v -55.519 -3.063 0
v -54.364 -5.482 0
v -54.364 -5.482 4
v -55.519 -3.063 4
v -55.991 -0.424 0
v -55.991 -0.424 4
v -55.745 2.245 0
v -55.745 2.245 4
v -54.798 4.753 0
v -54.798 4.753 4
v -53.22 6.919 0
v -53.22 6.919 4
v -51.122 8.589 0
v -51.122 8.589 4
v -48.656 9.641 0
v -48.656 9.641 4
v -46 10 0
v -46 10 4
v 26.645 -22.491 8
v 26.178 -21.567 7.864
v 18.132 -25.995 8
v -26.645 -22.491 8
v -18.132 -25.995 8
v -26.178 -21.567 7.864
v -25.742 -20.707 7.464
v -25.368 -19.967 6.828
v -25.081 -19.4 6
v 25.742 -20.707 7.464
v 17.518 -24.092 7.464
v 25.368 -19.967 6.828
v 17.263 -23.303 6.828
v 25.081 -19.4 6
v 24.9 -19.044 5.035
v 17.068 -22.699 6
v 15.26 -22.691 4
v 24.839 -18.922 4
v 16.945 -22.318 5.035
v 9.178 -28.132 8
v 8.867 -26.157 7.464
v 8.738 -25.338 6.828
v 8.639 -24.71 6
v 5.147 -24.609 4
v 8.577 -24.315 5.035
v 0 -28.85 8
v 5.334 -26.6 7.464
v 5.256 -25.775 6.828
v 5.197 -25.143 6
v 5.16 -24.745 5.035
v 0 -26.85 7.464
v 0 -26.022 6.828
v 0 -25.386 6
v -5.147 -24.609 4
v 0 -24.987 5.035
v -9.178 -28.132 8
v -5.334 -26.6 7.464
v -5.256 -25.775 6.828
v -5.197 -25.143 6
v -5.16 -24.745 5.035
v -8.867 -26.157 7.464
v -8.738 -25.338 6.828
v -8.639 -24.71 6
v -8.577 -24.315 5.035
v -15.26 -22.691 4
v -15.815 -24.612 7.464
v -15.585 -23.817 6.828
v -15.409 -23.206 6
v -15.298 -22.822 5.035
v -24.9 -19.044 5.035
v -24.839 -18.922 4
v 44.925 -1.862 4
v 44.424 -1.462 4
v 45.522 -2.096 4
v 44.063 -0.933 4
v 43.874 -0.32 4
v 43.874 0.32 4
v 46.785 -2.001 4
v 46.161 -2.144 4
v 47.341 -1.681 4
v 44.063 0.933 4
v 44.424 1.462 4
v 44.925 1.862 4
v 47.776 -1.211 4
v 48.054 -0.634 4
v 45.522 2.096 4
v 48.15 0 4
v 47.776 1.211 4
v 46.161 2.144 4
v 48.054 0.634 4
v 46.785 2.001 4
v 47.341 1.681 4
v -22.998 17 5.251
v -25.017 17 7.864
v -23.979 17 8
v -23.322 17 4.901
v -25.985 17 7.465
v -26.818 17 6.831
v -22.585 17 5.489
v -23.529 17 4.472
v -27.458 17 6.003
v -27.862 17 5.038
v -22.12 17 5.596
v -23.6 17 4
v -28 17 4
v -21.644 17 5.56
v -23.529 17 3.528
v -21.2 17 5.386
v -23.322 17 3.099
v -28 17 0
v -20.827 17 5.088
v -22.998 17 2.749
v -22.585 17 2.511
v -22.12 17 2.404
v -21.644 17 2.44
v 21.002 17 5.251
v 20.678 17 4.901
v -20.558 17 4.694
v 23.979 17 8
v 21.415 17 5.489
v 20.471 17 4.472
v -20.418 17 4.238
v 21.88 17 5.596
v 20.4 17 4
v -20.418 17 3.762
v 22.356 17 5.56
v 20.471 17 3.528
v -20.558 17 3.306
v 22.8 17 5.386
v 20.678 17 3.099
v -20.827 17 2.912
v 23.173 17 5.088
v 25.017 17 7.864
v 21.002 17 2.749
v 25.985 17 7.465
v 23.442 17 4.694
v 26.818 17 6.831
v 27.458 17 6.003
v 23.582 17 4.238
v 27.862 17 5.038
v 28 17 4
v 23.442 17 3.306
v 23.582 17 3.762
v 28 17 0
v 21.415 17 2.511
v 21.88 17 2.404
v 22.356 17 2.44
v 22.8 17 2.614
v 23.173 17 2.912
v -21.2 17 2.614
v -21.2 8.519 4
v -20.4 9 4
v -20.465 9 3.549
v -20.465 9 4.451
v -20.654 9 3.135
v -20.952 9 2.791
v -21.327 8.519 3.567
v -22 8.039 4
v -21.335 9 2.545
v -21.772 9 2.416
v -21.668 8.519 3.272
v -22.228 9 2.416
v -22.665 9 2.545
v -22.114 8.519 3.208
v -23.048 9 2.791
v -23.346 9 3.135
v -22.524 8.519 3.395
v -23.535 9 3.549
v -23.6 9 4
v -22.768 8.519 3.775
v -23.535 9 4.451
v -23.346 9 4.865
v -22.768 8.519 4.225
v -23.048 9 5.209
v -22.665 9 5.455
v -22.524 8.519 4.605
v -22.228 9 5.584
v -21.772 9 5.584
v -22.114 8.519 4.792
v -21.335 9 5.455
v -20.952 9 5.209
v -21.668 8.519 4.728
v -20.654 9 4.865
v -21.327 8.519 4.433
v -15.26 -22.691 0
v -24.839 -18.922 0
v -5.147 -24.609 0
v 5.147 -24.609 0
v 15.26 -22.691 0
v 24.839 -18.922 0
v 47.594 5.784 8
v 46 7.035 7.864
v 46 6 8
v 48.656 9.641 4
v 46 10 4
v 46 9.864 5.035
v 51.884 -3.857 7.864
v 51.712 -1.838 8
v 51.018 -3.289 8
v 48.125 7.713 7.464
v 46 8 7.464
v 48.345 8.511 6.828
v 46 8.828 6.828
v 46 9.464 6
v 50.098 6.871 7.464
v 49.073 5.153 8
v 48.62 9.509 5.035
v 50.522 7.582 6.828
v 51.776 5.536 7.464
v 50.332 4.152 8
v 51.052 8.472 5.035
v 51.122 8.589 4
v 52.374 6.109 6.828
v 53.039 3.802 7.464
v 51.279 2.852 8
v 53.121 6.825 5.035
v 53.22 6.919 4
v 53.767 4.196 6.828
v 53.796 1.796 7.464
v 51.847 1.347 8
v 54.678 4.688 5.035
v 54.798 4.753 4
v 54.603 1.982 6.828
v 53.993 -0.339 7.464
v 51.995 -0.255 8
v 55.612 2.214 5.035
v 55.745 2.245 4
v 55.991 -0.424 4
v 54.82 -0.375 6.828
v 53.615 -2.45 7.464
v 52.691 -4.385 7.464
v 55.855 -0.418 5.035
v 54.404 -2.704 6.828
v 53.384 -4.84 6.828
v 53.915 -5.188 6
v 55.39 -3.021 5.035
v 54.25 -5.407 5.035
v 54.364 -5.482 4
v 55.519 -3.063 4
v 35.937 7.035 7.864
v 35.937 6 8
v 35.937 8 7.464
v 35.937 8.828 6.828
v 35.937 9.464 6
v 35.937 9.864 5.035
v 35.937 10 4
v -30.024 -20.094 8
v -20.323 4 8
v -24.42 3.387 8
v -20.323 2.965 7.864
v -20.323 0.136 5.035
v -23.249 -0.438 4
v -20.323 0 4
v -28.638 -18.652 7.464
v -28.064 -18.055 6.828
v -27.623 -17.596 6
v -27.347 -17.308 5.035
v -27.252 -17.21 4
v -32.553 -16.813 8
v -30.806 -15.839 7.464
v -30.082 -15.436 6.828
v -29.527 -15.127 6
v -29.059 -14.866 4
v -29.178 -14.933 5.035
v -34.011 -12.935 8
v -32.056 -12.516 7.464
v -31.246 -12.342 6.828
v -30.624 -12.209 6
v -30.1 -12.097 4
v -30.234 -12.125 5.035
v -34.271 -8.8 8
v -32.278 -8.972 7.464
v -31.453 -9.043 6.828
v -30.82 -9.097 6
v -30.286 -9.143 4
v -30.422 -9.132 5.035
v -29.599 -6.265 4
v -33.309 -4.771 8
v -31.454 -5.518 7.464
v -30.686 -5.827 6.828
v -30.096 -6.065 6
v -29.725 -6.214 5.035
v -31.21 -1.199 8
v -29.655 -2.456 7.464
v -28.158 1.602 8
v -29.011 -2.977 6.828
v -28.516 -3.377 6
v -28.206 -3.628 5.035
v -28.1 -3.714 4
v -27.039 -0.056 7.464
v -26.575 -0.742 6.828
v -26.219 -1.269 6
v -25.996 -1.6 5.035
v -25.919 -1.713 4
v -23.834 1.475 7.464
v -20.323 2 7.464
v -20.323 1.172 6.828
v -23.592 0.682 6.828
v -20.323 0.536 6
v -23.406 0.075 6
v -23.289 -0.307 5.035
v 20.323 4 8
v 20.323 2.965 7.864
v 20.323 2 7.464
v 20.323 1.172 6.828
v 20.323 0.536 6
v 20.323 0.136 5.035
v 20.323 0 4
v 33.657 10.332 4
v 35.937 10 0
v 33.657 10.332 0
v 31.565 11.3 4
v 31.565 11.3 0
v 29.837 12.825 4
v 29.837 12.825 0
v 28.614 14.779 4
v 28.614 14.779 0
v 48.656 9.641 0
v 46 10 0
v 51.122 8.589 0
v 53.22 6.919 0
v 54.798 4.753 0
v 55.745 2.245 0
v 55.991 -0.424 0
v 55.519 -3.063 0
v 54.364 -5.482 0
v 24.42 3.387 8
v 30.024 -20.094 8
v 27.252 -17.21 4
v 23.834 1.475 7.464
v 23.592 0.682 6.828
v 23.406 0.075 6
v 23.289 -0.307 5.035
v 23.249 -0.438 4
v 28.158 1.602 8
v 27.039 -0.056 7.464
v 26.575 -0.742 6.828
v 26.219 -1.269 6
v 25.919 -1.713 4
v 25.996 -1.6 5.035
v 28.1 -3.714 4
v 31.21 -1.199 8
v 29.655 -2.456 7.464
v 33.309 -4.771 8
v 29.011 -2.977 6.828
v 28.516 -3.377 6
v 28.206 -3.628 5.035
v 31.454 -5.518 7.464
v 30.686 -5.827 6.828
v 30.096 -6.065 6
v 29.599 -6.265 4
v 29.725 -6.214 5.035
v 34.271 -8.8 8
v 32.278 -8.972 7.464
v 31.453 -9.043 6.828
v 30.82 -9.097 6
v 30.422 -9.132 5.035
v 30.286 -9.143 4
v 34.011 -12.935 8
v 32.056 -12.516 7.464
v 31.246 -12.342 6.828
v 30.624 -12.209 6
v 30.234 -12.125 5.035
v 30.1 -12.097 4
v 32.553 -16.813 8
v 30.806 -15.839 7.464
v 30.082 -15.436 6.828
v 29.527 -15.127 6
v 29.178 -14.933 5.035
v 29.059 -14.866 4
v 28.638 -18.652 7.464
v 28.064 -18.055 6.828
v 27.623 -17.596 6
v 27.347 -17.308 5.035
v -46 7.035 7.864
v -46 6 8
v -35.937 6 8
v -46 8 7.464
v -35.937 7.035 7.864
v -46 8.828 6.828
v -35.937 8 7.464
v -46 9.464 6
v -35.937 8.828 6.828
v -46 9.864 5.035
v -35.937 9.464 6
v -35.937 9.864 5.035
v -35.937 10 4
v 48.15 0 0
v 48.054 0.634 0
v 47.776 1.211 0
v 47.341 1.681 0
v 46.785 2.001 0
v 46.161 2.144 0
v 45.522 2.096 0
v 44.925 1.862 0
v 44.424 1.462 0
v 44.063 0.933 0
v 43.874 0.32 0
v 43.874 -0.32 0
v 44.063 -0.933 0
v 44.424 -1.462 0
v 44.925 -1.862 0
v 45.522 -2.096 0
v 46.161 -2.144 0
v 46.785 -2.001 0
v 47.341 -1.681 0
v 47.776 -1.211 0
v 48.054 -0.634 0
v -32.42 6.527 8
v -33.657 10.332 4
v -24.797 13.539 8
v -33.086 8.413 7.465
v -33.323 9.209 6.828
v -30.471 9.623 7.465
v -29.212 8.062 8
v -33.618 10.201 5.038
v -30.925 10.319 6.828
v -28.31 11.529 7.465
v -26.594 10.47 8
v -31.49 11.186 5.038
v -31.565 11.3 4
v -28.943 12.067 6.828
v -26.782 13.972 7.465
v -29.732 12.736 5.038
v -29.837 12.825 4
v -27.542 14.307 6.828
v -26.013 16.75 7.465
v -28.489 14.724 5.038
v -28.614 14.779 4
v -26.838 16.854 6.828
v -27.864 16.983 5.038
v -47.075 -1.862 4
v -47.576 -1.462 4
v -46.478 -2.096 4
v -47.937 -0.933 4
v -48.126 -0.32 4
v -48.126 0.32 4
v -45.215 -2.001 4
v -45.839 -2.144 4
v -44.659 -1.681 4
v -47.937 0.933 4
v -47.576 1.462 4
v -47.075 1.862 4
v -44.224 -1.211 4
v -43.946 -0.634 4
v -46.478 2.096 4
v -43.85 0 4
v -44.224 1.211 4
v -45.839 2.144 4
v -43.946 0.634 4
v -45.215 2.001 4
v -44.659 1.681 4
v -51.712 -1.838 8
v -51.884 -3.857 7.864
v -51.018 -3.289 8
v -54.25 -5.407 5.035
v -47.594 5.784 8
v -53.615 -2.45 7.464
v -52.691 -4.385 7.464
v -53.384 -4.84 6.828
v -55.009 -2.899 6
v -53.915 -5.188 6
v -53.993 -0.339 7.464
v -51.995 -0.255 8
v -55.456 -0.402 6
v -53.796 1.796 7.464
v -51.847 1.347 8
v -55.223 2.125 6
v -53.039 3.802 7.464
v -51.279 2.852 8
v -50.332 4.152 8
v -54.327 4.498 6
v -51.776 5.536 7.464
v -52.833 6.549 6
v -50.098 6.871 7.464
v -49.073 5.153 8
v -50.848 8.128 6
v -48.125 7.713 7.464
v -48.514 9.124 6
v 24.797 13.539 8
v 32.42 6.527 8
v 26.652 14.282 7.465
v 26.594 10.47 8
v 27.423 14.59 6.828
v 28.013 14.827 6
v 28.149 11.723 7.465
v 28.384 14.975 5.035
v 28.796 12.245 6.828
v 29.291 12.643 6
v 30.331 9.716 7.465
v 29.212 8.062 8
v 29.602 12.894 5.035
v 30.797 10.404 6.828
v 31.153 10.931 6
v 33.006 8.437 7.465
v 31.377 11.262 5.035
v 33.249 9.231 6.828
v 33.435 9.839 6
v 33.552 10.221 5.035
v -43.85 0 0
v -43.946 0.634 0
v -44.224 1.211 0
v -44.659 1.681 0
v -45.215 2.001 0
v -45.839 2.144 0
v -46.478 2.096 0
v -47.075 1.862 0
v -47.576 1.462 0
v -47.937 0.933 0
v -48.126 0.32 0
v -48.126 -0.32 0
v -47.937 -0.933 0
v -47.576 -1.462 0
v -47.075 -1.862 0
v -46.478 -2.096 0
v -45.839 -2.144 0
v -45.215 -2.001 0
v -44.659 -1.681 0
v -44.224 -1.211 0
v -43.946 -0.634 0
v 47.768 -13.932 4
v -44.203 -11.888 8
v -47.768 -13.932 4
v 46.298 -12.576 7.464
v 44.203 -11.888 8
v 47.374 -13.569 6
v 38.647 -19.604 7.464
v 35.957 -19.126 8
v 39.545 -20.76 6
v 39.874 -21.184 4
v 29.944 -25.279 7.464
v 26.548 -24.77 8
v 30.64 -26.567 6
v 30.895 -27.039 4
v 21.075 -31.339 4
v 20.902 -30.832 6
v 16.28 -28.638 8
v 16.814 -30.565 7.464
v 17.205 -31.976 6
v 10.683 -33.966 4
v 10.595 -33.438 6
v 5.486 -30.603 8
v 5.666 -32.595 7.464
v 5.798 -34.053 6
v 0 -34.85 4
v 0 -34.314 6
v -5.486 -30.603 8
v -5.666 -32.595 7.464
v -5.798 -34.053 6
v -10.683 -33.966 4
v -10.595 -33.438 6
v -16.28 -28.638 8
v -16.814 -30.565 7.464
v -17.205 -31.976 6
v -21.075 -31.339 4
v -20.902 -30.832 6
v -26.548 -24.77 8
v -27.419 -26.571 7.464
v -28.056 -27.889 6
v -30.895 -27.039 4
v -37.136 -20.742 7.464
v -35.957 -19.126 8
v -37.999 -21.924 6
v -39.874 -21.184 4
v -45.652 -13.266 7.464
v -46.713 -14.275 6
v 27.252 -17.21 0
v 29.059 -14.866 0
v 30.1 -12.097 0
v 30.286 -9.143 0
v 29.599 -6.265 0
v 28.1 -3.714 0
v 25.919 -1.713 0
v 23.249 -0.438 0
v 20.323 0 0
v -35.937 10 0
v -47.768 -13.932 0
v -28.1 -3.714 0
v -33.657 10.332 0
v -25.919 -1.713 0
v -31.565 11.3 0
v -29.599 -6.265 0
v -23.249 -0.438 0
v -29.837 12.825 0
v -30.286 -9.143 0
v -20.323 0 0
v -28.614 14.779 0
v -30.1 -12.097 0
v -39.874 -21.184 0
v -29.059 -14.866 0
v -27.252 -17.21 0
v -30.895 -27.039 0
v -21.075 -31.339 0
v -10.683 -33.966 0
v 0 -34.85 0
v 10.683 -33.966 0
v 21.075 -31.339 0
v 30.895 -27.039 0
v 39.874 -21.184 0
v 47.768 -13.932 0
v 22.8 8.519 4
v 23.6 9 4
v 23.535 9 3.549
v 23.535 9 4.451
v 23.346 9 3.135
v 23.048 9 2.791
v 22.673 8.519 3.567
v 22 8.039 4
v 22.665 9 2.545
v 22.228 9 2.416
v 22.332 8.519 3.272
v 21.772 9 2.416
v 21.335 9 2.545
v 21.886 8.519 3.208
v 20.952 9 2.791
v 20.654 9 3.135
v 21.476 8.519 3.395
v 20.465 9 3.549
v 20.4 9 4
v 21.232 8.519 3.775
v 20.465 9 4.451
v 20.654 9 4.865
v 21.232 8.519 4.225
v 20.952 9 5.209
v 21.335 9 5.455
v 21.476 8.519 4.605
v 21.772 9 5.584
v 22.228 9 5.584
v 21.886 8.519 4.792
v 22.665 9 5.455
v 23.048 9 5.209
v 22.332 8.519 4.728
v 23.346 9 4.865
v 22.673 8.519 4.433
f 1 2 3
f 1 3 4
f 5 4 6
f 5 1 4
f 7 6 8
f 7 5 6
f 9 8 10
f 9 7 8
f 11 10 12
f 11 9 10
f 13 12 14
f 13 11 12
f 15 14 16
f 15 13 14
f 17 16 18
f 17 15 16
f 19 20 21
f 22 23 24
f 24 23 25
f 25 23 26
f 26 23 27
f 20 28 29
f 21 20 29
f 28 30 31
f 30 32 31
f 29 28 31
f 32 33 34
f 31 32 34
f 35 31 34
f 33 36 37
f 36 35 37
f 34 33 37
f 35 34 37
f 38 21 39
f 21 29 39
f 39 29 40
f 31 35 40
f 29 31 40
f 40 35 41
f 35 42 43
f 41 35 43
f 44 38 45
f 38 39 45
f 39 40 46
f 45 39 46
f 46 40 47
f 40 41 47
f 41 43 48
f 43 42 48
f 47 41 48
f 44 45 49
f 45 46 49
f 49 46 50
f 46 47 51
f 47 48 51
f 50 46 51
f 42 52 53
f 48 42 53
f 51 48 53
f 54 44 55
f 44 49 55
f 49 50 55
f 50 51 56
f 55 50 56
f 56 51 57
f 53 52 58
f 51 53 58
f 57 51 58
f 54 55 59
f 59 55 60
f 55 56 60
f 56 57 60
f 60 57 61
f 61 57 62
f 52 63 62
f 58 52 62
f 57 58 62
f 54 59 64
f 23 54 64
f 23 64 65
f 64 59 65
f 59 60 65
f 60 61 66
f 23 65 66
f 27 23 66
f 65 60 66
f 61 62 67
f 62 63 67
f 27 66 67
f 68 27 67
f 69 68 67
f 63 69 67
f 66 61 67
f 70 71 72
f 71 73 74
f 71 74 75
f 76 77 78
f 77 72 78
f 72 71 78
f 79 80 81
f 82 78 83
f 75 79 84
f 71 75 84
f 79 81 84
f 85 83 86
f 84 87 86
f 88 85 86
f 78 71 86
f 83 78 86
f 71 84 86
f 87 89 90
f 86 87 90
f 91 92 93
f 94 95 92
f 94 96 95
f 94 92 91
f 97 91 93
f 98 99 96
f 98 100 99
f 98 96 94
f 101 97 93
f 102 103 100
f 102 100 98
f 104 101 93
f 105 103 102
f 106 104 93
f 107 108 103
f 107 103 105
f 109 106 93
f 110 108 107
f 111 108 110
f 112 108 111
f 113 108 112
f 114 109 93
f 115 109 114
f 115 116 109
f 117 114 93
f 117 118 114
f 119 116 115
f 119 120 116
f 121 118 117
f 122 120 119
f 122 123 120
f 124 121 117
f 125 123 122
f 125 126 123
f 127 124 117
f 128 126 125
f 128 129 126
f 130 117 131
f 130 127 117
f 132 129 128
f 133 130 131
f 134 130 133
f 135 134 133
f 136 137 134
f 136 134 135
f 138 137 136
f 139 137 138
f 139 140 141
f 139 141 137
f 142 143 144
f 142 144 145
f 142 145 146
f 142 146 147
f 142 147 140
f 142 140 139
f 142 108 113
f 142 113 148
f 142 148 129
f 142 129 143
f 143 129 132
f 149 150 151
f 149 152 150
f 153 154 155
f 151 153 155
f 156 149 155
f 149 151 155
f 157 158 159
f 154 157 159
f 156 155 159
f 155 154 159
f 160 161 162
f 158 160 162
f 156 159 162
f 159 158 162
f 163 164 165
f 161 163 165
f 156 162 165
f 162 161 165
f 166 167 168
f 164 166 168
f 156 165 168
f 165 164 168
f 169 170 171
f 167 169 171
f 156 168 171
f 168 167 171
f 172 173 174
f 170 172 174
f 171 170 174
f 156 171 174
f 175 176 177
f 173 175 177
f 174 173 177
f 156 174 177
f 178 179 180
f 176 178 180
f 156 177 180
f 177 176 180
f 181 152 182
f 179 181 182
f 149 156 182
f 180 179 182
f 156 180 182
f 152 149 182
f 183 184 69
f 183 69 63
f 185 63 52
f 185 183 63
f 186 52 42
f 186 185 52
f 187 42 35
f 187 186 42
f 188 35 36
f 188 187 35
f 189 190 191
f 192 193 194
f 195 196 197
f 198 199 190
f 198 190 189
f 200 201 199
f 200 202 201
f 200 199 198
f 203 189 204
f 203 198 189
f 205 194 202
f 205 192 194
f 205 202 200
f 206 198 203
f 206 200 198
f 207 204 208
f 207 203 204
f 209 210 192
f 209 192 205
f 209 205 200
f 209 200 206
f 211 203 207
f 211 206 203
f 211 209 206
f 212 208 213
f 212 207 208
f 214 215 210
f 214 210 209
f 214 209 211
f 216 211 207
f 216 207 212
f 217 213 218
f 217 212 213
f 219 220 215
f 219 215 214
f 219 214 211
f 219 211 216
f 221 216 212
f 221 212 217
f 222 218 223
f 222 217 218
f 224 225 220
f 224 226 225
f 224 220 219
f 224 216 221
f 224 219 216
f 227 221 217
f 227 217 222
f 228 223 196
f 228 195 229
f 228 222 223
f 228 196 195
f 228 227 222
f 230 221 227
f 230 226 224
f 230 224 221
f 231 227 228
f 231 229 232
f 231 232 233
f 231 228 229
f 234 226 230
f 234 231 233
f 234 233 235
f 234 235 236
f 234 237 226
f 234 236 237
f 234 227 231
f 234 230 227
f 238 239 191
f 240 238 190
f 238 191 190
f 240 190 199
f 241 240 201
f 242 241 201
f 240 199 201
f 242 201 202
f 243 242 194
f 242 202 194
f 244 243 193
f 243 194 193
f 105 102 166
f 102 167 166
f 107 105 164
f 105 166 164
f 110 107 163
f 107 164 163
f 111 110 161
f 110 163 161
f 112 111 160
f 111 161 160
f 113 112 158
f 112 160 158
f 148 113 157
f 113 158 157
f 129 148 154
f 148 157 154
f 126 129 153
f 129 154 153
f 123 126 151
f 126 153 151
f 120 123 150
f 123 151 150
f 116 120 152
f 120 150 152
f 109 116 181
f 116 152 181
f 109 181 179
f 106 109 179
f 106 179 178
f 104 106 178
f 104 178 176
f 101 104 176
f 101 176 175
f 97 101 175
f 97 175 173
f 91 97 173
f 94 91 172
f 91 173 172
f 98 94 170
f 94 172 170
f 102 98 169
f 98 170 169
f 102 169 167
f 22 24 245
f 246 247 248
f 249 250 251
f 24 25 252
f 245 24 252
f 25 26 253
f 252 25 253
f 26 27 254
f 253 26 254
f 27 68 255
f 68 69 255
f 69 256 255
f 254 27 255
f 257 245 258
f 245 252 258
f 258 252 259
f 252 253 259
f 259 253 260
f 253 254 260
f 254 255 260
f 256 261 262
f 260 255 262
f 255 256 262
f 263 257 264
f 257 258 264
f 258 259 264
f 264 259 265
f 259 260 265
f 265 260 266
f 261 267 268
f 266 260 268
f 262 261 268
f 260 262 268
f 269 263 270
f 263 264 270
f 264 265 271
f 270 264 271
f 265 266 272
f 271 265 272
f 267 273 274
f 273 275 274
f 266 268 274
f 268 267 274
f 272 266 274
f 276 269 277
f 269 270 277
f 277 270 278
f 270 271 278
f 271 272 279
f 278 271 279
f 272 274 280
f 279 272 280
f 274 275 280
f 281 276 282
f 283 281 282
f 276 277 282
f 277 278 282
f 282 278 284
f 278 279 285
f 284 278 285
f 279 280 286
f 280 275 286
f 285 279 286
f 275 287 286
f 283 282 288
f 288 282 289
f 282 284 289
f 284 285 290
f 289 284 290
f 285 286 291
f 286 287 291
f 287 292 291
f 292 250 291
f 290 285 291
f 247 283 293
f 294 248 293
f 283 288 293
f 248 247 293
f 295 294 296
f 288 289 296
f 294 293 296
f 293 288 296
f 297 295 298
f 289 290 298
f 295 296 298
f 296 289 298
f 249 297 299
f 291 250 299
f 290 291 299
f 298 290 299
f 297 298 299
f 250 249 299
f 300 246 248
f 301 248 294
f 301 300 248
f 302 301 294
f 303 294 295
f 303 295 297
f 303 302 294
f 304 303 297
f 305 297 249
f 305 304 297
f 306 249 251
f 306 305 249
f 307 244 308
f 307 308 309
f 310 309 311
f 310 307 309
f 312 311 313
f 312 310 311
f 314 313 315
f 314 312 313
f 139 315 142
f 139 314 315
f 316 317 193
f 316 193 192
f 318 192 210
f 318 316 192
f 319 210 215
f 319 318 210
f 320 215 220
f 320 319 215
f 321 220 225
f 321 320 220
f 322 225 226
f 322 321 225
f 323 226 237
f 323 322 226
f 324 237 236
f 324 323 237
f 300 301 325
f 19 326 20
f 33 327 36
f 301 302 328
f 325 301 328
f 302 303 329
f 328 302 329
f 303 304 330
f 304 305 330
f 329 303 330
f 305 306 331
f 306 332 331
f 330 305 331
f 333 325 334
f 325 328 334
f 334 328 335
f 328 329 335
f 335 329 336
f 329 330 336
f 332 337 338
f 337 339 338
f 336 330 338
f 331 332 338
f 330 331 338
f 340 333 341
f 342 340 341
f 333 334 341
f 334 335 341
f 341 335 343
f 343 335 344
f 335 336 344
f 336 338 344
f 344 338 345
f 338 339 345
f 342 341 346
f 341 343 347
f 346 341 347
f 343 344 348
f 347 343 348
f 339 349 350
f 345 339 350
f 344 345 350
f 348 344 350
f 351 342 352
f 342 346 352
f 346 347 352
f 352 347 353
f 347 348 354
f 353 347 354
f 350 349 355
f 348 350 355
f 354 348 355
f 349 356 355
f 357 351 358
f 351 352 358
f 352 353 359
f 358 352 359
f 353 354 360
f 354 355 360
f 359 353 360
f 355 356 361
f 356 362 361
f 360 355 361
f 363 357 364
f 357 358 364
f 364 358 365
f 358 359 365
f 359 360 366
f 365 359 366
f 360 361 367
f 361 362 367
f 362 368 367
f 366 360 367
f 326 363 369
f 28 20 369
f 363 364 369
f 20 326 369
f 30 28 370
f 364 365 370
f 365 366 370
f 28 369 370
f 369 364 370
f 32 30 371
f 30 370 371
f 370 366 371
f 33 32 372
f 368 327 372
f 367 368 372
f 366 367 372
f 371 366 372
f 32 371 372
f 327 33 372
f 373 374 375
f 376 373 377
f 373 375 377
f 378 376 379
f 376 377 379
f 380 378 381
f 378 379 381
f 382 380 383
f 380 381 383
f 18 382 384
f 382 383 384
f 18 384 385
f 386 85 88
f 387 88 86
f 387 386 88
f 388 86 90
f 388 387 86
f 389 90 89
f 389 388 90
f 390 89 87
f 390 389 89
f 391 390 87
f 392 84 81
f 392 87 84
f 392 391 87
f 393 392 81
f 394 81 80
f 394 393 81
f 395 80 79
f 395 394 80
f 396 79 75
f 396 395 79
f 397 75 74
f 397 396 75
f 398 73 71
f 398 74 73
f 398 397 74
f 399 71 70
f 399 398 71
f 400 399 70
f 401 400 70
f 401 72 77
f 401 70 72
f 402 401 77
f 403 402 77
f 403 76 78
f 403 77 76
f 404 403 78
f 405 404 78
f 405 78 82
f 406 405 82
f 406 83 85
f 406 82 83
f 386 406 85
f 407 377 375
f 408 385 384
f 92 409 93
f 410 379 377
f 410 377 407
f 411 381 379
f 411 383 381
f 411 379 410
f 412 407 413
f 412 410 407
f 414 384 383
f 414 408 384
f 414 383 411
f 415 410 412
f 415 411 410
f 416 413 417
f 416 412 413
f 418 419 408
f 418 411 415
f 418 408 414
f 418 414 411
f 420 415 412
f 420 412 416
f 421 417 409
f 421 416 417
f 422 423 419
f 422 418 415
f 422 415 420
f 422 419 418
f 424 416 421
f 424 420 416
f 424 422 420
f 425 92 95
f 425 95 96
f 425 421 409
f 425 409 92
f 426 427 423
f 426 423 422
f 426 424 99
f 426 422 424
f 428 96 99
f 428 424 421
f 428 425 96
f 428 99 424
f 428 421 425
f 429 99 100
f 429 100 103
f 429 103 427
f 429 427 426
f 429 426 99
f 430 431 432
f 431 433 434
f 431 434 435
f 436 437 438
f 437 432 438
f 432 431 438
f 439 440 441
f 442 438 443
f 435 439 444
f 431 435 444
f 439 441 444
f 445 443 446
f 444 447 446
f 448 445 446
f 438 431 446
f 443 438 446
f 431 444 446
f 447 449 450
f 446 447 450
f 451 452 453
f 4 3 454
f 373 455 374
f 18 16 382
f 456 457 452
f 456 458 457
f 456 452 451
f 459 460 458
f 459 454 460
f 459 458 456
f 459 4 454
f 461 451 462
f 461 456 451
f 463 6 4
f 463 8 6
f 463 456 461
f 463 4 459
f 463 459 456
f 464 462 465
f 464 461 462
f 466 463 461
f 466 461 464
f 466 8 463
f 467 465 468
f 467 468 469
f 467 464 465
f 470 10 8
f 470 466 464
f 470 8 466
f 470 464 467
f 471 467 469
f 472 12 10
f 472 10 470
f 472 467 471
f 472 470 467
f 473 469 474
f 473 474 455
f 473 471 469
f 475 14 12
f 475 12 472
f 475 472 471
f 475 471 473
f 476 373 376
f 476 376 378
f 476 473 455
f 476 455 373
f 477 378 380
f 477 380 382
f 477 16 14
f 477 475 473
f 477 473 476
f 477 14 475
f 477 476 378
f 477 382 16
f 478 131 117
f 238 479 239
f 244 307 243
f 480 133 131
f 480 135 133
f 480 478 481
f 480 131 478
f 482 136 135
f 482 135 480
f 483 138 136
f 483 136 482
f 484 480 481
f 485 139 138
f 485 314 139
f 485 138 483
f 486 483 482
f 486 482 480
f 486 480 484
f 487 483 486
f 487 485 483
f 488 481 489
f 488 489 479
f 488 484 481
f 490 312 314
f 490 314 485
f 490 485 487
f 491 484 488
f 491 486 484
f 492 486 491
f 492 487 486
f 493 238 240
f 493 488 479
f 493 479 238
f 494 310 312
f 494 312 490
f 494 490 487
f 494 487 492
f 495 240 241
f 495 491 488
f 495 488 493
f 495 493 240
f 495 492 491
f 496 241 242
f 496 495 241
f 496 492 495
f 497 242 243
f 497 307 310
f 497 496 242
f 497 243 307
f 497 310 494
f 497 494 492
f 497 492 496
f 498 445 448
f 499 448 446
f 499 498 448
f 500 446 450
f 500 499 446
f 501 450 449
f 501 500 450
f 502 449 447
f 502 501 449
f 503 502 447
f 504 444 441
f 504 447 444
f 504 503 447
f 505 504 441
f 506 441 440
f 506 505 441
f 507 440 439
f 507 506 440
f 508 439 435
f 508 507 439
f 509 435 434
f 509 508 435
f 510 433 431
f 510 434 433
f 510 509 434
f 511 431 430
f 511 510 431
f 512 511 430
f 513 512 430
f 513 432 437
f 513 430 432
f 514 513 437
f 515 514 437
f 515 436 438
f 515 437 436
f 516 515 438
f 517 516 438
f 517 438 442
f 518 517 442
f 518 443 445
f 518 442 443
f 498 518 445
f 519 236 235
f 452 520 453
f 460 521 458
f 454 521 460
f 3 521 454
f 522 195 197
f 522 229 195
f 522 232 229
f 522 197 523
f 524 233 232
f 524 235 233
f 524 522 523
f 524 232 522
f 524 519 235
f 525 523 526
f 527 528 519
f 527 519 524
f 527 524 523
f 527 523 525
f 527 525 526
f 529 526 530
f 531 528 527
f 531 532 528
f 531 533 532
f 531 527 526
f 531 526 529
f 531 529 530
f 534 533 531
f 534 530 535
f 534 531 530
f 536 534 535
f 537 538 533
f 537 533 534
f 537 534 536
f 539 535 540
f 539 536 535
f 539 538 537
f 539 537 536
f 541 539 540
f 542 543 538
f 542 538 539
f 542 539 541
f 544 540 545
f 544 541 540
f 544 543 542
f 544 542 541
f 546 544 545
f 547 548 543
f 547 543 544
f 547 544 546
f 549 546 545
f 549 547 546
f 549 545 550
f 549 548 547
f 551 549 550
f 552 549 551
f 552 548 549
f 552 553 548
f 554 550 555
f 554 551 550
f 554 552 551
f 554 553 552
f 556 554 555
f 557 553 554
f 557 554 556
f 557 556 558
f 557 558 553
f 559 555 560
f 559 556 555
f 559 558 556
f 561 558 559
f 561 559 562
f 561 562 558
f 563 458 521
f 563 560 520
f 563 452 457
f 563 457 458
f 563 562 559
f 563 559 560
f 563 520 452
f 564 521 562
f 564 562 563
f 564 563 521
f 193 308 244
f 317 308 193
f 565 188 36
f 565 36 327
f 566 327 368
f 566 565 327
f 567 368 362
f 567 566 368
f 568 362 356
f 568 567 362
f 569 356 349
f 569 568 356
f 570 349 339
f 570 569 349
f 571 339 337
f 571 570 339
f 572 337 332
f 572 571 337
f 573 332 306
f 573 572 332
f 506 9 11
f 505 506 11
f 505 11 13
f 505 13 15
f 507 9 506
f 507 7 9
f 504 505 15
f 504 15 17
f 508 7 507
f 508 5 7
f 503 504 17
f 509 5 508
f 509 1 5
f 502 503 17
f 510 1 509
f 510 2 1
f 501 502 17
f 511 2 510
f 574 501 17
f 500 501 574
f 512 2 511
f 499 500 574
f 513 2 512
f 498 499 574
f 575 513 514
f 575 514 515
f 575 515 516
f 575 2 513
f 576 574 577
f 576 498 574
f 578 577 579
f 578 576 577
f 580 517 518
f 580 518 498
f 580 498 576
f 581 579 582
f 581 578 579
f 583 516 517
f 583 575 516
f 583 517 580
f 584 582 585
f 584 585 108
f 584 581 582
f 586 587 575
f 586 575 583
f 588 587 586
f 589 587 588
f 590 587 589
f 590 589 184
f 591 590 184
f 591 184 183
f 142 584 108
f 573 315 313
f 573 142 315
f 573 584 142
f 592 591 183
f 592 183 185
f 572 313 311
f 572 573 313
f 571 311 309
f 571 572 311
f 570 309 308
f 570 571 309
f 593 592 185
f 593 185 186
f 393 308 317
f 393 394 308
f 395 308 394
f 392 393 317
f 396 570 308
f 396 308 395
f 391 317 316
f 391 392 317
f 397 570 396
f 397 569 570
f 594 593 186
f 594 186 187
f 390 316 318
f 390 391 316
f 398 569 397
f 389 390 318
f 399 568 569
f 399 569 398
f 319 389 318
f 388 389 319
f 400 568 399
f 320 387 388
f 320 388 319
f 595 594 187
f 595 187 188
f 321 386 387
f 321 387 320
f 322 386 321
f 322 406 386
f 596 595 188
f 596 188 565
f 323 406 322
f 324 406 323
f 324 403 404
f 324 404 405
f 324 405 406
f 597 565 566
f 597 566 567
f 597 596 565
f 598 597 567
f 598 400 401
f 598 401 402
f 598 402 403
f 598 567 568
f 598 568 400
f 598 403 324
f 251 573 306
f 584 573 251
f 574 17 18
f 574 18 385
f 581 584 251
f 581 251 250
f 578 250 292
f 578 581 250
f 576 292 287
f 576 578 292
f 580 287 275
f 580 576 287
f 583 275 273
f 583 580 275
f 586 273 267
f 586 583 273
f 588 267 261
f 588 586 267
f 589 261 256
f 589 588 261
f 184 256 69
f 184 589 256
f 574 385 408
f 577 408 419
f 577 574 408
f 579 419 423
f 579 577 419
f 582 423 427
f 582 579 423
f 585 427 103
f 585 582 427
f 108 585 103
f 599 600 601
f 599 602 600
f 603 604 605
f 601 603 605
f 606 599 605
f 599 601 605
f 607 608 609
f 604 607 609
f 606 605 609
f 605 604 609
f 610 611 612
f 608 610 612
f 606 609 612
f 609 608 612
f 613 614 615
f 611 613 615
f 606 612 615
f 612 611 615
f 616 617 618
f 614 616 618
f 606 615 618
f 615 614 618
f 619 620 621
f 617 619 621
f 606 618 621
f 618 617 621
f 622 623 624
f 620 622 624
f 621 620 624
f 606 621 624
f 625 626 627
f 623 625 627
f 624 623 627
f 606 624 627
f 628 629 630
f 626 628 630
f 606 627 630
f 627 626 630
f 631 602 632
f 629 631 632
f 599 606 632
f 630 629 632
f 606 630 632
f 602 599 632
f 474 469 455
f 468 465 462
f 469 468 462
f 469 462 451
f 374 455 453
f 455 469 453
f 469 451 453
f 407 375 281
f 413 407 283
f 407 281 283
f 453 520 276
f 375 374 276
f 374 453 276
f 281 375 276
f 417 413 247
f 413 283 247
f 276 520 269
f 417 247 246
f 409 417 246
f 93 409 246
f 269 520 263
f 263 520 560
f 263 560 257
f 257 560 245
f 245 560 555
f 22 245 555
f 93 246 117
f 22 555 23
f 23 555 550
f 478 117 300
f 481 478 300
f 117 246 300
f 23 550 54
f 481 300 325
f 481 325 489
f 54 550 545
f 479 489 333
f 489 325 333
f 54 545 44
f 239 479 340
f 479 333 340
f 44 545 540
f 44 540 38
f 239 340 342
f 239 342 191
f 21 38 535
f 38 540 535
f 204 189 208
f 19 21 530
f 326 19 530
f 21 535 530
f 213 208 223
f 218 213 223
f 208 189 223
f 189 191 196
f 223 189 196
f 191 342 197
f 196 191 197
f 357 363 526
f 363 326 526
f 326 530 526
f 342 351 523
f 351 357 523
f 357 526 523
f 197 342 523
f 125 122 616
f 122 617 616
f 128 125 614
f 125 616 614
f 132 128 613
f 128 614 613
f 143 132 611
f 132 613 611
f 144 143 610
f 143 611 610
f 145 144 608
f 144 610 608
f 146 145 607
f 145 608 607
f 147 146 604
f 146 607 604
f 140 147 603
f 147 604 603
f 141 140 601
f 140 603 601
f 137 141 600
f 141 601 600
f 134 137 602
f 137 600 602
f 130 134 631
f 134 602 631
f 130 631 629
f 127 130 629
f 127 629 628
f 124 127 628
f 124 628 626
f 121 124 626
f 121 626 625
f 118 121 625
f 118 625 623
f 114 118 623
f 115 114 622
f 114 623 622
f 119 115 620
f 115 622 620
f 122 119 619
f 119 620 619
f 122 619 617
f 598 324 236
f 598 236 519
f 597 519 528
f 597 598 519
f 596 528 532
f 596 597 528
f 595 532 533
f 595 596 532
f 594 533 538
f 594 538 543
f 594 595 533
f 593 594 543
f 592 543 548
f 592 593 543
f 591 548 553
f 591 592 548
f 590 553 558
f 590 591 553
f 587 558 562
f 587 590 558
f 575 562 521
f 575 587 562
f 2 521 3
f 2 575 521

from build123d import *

# Parameters (mm, degrees)
SKETCH1_R                = 2.15
BOSS_EXTRUDE1_DEPTH      = 8
BOSS_EXTRUDE2_START      = -4
BOSS_EXTRUDE2_DEPTH      = 4
SKETCH3_W                = 56
SKETCH3_H                = 8
BOSS_EXTRUDE6_DEPTH      = 7
BOSS_EXTRUDE4_START      = -8
BOSS_EXTRUDE4_DEPTH      = 8
CUT_EXTRUDE1_DEPTH       = 67.44206881
FILLET4_R                = 8
FILLET3_R                = 4
M3_CLEARANCE_HOLE1_D     = 3.2
M3_CLEARANCE_HOLE1_DEPTH = 8
M3_CLEARANCE_HOLE1_TIP   = 0.96137699


with BuildPart() as part:
    # Sketch1 → Boss-Extrude1 (new body)
    with BuildSketch(Plane.XY):
        with BuildLine():
            Line((-46, 10), (46, 10))
            ThreePointArc((46, 10), (56, 0), (46, -10))
            Line((46, -10), (-46, -10))
            ThreePointArc((-46, -10), (-56, 0), (-46, 10))
        make_face()
        with Locations((-46, 0)):
            Circle(SKETCH1_R, mode=Mode.SUBTRACT)
        with Locations((46, 0)):
            Circle(SKETCH1_R, mode=Mode.SUBTRACT)
    extrude(amount=BOSS_EXTRUDE1_DEPTH)

    # Sketch2 → Boss-Extrude2 (add)
    with BuildSketch(Plane.XY.offset(8).offset(BOSS_EXTRUDE2_START)):
        with BuildLine():
            Line((-46, -10), (46, -10))
            ThreePointArc((46, -10), (56, 0), (46, 10))
            Line((46, 10), (-46, 10))
            ThreePointArc((-46, 10), (-56, 0), (-46, -10))
        make_face()
    extrude(amount=BOSS_EXTRUDE2_DEPTH)

    # Sketch3 → Boss-Extrude6 (add)
    with BuildSketch(Plane(origin=(0, 10, 0), x_dir=(1, 0, 0), z_dir=(0, 1, 0))):
        with Locations((0, -4)):
            Rectangle(SKETCH3_W, SKETCH3_H)
    extrude(amount=BOSS_EXTRUDE6_DEPTH)

    # Sketch4 → Boss-Extrude4 (add)
    with BuildSketch(Plane.XY.offset(8).offset(BOSS_EXTRUDE4_START)):
        with BuildLine():
            Line((-46, -10), (46, -10))
            ThreePointArc((46, -10), (50.753025174, -8.798224349), (54.363636364, -5.481750339))
            ThreePointArc((54.363636364, -5.481750339), (0, -34.850373137), (-54.363636364, -5.481750339))
            ThreePointArc((-54.363636364, -5.481750339), (-50.753025174, -8.798224349), (-46, -10))
        make_face()
    extrude(amount=BOSS_EXTRUDE4_DEPTH)

    # Sketch5 → Cut-Extrude1 (cut, through all)
    with BuildSketch(Plane(origin=(0, 0, 0), x_dir=(-1, 0, 0), z_dir=(0, 0, -1))):
        with BuildLine():
            Line((-20.322585041, 0), (20.322585041, 0))
            ThreePointArc((20.322585041, 0), (30.049388036, -7.678512657), (24.83871505, -18.922139303))
            ThreePointArc((24.83871505, -18.922139303), (0, -24.850373137), (-24.83871505, -18.922139303))
            ThreePointArc((-24.83871505, -18.922139303), (-30.049388036, -7.678512657), (-20.322585041, 0))
        make_face()
    extrude(amount=-CUT_EXTRUDE1_DEPTH, mode=Mode.SUBTRACT)

    # Fillet4
    # the kernel refuses this fillet: 8 mm, written as the material it adds along each edge
    with BuildSketch(Plane(origin=(28, 10, 8), x_dir=(0, 1, 0), z_dir=(0, 0, -1))) as fillet4_piece_1:
        with BuildLine():
            CenterArc((8, 7.937253933), FILLET4_R, 180, 82.819244219)
            Line((0, 7.937253933), (-0.16, 7.937253933))
            Line((-0.16, 7.937253933), (-0.16, 0))
            Line((-0.16, 0), (0, -0.16))
            ThreePointArc((0, -0.16), (3.5, -0.16), (6.98, -0.158745079))
            Line((6.98, -0.158745079), (7, 0))
        make_face()
    extrude(amount=8)
    with BuildSketch(Plane(origin=(-28, 10, 0), x_dir=(-1, 0, 0), z_dir=(0, 0, 1))) as fillet4_piece_2:
        with BuildLine():
            CenterArc((7.937253933, -8), FILLET4_R, 90, 82.819244219)
            Line((0, -7), (-0.158745079, -6.98))
            ThreePointArc((-0.158745079, -6.98), (-0.16, -3.5), (-0.16, 0))
            Line((-0.16, 0), (0, 0.16))
            Line((0, 0.16), (7.937253933, 0.16))
            Line((7.937253933, 0.16), (7.937253933, 0))
        make_face()
    extrude(amount=8)

    # Fillet3
    fillet3_edges = [part.edges().sort_by_distance(p)[0] for p in [
        (40.968626967, 10, 8),
        (-54.798224349, 4.753025174, 8),
        (54.798224349, 4.753025174, 8),
        (0, -34.850373137, 8),
        (-30.049388036, -7.678512657, 8),
        (0, -24.850373137, 8),
        (30.049388036, -7.678512657, 8),
        (0, 0, 8),
        (-40.968626967, 10, 8),
        (30.645751311, 12, 8),
        (-30.645751311, 12, 8),
    ]]
    fillet(fillet3_edges, radius=FILLET3_R)

    # M3 Clearance Hole1
    with Locations(Plane(origin=(0, 17, 0), x_dir=(1, 0, 0), z_dir=(0, 1, 0))):
        with Locations((-22, -4), (22, -4)):
            Hole(M3_CLEARANCE_HOLE1_D / 2, depth=M3_CLEARANCE_HOLE1_DEPTH)
            with Locations((0, 0, -(M3_CLEARANCE_HOLE1_DEPTH + M3_CLEARANCE_HOLE1_TIP / 2))):  # 118° drill point
                Cone(0, M3_CLEARANCE_HOLE1_D / 2, M3_CLEARANCE_HOLE1_TIP, mode=Mode.SUBTRACT)


solid = part.part
